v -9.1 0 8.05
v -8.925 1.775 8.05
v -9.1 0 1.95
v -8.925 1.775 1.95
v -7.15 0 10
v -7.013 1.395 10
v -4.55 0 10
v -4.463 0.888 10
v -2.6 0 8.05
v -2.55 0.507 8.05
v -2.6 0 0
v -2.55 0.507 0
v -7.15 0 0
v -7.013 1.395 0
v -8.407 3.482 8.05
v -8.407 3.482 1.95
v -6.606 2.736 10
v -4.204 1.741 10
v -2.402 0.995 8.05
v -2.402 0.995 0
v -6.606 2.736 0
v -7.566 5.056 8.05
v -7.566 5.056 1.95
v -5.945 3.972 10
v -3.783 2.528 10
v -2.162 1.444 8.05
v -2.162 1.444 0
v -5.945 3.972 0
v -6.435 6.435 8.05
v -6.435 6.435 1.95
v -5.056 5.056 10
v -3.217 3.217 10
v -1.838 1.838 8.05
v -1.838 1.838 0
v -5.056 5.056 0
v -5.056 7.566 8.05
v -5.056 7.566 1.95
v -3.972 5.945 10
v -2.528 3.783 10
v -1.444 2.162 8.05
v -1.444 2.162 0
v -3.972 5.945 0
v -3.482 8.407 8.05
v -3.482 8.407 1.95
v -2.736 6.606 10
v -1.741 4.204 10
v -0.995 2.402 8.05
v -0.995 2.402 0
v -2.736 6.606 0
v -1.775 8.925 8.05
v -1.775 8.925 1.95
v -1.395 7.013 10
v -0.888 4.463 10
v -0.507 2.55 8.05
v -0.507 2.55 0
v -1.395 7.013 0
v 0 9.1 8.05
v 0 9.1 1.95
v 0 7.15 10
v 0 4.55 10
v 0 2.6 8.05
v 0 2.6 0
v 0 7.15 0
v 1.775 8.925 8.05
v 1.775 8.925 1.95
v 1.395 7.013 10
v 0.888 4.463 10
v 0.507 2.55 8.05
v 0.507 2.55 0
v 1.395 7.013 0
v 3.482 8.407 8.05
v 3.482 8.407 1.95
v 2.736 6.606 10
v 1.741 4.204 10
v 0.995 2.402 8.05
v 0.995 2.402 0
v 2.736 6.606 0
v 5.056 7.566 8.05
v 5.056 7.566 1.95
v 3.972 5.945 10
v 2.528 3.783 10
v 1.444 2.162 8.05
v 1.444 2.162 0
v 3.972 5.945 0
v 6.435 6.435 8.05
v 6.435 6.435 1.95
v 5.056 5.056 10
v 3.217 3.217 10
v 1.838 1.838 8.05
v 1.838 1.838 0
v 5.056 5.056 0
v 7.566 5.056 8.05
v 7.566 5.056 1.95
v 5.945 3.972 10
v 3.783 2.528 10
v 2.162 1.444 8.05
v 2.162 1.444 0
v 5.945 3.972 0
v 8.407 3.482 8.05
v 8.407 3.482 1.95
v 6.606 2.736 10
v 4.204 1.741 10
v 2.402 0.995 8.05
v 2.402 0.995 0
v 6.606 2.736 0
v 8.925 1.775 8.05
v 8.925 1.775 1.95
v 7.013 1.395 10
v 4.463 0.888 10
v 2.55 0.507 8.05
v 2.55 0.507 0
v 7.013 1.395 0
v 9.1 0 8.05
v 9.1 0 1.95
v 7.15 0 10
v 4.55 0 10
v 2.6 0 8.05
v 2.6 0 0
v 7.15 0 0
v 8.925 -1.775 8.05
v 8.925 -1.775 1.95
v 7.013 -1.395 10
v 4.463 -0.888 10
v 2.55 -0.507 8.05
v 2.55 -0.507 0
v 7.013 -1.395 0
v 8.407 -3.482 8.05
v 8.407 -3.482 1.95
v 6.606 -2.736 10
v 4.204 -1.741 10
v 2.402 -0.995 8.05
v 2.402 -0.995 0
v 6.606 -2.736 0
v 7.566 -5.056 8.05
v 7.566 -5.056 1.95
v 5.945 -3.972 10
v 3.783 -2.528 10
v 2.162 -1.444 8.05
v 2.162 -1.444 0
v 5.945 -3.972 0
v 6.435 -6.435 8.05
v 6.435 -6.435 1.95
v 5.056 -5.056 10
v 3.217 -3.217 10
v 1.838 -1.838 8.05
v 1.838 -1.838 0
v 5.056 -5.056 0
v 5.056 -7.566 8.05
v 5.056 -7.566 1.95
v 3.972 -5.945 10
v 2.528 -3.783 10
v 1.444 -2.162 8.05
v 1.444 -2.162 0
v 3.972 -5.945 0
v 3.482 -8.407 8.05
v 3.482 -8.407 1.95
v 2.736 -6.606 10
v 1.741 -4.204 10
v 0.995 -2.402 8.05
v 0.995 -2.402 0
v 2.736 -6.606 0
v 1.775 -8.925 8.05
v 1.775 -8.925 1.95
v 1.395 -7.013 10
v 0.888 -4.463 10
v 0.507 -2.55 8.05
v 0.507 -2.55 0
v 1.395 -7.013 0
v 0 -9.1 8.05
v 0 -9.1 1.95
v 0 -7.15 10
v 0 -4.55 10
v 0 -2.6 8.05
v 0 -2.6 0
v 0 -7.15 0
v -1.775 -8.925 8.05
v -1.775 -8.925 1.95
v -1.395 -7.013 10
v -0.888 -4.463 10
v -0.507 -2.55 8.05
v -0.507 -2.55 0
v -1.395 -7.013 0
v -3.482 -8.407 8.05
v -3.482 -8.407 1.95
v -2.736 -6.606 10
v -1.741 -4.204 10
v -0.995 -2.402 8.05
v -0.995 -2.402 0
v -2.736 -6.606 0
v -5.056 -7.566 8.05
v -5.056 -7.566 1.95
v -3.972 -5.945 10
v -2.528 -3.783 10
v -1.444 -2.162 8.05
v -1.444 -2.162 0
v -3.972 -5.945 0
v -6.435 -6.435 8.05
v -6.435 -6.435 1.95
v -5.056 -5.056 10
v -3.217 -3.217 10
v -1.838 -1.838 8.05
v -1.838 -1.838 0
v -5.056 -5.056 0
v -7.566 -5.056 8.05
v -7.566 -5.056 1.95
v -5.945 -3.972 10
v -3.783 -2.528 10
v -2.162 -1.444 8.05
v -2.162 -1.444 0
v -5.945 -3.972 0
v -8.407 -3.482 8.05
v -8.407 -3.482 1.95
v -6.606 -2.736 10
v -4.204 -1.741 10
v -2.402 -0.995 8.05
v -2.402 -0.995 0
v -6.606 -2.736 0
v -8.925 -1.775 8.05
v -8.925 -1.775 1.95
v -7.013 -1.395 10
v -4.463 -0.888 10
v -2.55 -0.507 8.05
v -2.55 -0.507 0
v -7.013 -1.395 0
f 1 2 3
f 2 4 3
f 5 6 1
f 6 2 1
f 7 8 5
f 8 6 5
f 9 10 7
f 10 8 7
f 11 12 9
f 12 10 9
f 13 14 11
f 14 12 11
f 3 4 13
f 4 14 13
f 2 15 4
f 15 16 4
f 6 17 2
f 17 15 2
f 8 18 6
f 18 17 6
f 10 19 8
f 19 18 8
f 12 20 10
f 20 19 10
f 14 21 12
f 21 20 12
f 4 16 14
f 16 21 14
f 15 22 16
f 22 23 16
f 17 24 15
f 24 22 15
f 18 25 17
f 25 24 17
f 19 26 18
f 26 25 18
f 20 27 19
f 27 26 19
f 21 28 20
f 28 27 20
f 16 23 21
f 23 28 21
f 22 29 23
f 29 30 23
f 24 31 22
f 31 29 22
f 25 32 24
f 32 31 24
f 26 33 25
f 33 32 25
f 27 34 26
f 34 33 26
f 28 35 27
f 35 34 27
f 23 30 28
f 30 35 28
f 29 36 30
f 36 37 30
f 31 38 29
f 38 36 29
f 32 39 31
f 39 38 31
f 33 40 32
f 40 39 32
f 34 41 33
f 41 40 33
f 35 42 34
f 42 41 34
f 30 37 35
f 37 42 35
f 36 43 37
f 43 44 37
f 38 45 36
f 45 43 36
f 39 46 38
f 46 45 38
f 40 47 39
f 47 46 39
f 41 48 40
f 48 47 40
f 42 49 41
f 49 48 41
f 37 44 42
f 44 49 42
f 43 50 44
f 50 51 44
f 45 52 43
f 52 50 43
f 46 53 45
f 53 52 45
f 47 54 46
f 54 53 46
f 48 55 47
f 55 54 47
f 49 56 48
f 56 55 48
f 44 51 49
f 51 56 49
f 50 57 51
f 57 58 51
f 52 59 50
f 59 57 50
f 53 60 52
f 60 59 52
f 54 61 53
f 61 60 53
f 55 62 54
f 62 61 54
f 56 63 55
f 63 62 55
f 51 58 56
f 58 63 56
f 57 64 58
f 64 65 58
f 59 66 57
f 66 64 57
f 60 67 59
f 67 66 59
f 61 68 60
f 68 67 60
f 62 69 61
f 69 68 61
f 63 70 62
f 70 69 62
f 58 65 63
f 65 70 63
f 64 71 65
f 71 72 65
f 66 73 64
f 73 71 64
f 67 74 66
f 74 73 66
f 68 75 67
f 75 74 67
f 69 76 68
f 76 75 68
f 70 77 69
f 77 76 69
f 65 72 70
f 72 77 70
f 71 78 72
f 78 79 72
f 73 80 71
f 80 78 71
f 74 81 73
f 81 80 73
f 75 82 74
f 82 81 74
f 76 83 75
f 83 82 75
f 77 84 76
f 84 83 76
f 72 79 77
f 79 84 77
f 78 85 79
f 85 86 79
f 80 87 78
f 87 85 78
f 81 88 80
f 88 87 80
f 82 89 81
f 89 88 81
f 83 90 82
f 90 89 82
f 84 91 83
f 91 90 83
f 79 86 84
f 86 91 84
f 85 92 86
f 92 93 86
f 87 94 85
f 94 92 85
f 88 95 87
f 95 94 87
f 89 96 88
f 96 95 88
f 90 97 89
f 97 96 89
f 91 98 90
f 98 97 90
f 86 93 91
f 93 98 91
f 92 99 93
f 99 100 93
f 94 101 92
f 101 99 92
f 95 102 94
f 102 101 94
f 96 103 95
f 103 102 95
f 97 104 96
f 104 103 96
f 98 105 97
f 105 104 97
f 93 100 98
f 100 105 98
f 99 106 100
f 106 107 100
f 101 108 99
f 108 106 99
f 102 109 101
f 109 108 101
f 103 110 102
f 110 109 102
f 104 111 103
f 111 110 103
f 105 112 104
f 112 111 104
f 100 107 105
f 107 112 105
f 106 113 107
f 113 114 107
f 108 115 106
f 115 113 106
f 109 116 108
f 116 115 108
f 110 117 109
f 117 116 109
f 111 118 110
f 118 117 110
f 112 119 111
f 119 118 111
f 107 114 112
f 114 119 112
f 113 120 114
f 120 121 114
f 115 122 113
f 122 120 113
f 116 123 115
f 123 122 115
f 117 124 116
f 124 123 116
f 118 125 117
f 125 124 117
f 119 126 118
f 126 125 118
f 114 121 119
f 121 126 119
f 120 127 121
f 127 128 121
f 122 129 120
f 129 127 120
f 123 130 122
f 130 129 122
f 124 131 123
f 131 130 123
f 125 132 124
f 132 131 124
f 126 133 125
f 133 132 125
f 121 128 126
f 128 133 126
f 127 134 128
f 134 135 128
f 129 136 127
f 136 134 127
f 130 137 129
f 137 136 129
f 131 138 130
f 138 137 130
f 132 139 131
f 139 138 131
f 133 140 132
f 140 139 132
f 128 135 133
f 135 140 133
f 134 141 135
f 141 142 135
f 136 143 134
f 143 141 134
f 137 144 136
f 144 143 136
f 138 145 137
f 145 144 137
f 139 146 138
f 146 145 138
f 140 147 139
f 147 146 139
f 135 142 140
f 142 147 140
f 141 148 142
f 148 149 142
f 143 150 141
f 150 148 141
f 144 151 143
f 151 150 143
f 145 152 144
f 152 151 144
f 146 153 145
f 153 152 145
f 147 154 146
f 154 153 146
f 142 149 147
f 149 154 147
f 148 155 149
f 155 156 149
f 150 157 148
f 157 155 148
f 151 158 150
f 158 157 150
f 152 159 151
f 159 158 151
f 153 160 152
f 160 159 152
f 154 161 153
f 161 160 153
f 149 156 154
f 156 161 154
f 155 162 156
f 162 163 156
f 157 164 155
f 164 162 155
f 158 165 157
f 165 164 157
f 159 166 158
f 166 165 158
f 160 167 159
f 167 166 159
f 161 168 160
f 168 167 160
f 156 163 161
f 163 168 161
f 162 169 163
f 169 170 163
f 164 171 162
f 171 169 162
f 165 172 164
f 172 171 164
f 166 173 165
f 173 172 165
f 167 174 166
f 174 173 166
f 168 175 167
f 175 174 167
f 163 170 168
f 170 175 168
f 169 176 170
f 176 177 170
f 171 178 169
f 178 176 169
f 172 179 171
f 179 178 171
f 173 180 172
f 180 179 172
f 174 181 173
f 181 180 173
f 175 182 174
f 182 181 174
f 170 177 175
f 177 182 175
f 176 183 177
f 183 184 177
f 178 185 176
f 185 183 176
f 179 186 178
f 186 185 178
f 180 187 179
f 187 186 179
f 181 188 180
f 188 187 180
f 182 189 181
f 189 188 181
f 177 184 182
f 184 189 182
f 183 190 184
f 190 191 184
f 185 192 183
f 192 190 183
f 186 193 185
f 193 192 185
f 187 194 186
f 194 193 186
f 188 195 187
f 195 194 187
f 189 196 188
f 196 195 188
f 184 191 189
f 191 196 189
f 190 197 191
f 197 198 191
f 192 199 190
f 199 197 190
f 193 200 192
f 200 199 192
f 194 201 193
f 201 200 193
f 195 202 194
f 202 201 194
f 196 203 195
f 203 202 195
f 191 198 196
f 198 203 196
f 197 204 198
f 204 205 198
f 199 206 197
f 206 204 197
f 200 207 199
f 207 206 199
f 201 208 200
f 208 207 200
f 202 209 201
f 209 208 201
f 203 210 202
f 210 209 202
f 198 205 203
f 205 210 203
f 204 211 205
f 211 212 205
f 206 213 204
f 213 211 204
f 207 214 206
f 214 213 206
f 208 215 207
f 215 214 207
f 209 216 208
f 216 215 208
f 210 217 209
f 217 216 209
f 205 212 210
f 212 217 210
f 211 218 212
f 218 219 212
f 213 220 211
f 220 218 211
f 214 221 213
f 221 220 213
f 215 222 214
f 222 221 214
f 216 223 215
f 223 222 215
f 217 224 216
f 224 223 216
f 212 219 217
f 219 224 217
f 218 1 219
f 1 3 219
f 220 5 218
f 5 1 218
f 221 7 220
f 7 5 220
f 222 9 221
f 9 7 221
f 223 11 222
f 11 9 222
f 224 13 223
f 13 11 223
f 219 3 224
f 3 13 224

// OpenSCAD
$fn = 32;

// ----------------------------------------------------------------------
// Form washer: chamfered washer, 18.2 mm outside, 5.2 mm bore
// ----------------------------------------------------------------------

// --- parameters (mm) ---
revolve_angle = 360;      // full turn around the Z axis
profile_points = 7;       // points of the closed outline

profile = [[2.6, 0], [7.15, 0], [9.1, 1.95], [9.1, 8.05], [7.15, 10], [4.55, 10], [2.6, 8.05]];  // single closed polygon, 7 points, counter clockwise

// --- the one profile operation ---
rotate_extrude(angle = revolve_angle) polygon(points = profile);
